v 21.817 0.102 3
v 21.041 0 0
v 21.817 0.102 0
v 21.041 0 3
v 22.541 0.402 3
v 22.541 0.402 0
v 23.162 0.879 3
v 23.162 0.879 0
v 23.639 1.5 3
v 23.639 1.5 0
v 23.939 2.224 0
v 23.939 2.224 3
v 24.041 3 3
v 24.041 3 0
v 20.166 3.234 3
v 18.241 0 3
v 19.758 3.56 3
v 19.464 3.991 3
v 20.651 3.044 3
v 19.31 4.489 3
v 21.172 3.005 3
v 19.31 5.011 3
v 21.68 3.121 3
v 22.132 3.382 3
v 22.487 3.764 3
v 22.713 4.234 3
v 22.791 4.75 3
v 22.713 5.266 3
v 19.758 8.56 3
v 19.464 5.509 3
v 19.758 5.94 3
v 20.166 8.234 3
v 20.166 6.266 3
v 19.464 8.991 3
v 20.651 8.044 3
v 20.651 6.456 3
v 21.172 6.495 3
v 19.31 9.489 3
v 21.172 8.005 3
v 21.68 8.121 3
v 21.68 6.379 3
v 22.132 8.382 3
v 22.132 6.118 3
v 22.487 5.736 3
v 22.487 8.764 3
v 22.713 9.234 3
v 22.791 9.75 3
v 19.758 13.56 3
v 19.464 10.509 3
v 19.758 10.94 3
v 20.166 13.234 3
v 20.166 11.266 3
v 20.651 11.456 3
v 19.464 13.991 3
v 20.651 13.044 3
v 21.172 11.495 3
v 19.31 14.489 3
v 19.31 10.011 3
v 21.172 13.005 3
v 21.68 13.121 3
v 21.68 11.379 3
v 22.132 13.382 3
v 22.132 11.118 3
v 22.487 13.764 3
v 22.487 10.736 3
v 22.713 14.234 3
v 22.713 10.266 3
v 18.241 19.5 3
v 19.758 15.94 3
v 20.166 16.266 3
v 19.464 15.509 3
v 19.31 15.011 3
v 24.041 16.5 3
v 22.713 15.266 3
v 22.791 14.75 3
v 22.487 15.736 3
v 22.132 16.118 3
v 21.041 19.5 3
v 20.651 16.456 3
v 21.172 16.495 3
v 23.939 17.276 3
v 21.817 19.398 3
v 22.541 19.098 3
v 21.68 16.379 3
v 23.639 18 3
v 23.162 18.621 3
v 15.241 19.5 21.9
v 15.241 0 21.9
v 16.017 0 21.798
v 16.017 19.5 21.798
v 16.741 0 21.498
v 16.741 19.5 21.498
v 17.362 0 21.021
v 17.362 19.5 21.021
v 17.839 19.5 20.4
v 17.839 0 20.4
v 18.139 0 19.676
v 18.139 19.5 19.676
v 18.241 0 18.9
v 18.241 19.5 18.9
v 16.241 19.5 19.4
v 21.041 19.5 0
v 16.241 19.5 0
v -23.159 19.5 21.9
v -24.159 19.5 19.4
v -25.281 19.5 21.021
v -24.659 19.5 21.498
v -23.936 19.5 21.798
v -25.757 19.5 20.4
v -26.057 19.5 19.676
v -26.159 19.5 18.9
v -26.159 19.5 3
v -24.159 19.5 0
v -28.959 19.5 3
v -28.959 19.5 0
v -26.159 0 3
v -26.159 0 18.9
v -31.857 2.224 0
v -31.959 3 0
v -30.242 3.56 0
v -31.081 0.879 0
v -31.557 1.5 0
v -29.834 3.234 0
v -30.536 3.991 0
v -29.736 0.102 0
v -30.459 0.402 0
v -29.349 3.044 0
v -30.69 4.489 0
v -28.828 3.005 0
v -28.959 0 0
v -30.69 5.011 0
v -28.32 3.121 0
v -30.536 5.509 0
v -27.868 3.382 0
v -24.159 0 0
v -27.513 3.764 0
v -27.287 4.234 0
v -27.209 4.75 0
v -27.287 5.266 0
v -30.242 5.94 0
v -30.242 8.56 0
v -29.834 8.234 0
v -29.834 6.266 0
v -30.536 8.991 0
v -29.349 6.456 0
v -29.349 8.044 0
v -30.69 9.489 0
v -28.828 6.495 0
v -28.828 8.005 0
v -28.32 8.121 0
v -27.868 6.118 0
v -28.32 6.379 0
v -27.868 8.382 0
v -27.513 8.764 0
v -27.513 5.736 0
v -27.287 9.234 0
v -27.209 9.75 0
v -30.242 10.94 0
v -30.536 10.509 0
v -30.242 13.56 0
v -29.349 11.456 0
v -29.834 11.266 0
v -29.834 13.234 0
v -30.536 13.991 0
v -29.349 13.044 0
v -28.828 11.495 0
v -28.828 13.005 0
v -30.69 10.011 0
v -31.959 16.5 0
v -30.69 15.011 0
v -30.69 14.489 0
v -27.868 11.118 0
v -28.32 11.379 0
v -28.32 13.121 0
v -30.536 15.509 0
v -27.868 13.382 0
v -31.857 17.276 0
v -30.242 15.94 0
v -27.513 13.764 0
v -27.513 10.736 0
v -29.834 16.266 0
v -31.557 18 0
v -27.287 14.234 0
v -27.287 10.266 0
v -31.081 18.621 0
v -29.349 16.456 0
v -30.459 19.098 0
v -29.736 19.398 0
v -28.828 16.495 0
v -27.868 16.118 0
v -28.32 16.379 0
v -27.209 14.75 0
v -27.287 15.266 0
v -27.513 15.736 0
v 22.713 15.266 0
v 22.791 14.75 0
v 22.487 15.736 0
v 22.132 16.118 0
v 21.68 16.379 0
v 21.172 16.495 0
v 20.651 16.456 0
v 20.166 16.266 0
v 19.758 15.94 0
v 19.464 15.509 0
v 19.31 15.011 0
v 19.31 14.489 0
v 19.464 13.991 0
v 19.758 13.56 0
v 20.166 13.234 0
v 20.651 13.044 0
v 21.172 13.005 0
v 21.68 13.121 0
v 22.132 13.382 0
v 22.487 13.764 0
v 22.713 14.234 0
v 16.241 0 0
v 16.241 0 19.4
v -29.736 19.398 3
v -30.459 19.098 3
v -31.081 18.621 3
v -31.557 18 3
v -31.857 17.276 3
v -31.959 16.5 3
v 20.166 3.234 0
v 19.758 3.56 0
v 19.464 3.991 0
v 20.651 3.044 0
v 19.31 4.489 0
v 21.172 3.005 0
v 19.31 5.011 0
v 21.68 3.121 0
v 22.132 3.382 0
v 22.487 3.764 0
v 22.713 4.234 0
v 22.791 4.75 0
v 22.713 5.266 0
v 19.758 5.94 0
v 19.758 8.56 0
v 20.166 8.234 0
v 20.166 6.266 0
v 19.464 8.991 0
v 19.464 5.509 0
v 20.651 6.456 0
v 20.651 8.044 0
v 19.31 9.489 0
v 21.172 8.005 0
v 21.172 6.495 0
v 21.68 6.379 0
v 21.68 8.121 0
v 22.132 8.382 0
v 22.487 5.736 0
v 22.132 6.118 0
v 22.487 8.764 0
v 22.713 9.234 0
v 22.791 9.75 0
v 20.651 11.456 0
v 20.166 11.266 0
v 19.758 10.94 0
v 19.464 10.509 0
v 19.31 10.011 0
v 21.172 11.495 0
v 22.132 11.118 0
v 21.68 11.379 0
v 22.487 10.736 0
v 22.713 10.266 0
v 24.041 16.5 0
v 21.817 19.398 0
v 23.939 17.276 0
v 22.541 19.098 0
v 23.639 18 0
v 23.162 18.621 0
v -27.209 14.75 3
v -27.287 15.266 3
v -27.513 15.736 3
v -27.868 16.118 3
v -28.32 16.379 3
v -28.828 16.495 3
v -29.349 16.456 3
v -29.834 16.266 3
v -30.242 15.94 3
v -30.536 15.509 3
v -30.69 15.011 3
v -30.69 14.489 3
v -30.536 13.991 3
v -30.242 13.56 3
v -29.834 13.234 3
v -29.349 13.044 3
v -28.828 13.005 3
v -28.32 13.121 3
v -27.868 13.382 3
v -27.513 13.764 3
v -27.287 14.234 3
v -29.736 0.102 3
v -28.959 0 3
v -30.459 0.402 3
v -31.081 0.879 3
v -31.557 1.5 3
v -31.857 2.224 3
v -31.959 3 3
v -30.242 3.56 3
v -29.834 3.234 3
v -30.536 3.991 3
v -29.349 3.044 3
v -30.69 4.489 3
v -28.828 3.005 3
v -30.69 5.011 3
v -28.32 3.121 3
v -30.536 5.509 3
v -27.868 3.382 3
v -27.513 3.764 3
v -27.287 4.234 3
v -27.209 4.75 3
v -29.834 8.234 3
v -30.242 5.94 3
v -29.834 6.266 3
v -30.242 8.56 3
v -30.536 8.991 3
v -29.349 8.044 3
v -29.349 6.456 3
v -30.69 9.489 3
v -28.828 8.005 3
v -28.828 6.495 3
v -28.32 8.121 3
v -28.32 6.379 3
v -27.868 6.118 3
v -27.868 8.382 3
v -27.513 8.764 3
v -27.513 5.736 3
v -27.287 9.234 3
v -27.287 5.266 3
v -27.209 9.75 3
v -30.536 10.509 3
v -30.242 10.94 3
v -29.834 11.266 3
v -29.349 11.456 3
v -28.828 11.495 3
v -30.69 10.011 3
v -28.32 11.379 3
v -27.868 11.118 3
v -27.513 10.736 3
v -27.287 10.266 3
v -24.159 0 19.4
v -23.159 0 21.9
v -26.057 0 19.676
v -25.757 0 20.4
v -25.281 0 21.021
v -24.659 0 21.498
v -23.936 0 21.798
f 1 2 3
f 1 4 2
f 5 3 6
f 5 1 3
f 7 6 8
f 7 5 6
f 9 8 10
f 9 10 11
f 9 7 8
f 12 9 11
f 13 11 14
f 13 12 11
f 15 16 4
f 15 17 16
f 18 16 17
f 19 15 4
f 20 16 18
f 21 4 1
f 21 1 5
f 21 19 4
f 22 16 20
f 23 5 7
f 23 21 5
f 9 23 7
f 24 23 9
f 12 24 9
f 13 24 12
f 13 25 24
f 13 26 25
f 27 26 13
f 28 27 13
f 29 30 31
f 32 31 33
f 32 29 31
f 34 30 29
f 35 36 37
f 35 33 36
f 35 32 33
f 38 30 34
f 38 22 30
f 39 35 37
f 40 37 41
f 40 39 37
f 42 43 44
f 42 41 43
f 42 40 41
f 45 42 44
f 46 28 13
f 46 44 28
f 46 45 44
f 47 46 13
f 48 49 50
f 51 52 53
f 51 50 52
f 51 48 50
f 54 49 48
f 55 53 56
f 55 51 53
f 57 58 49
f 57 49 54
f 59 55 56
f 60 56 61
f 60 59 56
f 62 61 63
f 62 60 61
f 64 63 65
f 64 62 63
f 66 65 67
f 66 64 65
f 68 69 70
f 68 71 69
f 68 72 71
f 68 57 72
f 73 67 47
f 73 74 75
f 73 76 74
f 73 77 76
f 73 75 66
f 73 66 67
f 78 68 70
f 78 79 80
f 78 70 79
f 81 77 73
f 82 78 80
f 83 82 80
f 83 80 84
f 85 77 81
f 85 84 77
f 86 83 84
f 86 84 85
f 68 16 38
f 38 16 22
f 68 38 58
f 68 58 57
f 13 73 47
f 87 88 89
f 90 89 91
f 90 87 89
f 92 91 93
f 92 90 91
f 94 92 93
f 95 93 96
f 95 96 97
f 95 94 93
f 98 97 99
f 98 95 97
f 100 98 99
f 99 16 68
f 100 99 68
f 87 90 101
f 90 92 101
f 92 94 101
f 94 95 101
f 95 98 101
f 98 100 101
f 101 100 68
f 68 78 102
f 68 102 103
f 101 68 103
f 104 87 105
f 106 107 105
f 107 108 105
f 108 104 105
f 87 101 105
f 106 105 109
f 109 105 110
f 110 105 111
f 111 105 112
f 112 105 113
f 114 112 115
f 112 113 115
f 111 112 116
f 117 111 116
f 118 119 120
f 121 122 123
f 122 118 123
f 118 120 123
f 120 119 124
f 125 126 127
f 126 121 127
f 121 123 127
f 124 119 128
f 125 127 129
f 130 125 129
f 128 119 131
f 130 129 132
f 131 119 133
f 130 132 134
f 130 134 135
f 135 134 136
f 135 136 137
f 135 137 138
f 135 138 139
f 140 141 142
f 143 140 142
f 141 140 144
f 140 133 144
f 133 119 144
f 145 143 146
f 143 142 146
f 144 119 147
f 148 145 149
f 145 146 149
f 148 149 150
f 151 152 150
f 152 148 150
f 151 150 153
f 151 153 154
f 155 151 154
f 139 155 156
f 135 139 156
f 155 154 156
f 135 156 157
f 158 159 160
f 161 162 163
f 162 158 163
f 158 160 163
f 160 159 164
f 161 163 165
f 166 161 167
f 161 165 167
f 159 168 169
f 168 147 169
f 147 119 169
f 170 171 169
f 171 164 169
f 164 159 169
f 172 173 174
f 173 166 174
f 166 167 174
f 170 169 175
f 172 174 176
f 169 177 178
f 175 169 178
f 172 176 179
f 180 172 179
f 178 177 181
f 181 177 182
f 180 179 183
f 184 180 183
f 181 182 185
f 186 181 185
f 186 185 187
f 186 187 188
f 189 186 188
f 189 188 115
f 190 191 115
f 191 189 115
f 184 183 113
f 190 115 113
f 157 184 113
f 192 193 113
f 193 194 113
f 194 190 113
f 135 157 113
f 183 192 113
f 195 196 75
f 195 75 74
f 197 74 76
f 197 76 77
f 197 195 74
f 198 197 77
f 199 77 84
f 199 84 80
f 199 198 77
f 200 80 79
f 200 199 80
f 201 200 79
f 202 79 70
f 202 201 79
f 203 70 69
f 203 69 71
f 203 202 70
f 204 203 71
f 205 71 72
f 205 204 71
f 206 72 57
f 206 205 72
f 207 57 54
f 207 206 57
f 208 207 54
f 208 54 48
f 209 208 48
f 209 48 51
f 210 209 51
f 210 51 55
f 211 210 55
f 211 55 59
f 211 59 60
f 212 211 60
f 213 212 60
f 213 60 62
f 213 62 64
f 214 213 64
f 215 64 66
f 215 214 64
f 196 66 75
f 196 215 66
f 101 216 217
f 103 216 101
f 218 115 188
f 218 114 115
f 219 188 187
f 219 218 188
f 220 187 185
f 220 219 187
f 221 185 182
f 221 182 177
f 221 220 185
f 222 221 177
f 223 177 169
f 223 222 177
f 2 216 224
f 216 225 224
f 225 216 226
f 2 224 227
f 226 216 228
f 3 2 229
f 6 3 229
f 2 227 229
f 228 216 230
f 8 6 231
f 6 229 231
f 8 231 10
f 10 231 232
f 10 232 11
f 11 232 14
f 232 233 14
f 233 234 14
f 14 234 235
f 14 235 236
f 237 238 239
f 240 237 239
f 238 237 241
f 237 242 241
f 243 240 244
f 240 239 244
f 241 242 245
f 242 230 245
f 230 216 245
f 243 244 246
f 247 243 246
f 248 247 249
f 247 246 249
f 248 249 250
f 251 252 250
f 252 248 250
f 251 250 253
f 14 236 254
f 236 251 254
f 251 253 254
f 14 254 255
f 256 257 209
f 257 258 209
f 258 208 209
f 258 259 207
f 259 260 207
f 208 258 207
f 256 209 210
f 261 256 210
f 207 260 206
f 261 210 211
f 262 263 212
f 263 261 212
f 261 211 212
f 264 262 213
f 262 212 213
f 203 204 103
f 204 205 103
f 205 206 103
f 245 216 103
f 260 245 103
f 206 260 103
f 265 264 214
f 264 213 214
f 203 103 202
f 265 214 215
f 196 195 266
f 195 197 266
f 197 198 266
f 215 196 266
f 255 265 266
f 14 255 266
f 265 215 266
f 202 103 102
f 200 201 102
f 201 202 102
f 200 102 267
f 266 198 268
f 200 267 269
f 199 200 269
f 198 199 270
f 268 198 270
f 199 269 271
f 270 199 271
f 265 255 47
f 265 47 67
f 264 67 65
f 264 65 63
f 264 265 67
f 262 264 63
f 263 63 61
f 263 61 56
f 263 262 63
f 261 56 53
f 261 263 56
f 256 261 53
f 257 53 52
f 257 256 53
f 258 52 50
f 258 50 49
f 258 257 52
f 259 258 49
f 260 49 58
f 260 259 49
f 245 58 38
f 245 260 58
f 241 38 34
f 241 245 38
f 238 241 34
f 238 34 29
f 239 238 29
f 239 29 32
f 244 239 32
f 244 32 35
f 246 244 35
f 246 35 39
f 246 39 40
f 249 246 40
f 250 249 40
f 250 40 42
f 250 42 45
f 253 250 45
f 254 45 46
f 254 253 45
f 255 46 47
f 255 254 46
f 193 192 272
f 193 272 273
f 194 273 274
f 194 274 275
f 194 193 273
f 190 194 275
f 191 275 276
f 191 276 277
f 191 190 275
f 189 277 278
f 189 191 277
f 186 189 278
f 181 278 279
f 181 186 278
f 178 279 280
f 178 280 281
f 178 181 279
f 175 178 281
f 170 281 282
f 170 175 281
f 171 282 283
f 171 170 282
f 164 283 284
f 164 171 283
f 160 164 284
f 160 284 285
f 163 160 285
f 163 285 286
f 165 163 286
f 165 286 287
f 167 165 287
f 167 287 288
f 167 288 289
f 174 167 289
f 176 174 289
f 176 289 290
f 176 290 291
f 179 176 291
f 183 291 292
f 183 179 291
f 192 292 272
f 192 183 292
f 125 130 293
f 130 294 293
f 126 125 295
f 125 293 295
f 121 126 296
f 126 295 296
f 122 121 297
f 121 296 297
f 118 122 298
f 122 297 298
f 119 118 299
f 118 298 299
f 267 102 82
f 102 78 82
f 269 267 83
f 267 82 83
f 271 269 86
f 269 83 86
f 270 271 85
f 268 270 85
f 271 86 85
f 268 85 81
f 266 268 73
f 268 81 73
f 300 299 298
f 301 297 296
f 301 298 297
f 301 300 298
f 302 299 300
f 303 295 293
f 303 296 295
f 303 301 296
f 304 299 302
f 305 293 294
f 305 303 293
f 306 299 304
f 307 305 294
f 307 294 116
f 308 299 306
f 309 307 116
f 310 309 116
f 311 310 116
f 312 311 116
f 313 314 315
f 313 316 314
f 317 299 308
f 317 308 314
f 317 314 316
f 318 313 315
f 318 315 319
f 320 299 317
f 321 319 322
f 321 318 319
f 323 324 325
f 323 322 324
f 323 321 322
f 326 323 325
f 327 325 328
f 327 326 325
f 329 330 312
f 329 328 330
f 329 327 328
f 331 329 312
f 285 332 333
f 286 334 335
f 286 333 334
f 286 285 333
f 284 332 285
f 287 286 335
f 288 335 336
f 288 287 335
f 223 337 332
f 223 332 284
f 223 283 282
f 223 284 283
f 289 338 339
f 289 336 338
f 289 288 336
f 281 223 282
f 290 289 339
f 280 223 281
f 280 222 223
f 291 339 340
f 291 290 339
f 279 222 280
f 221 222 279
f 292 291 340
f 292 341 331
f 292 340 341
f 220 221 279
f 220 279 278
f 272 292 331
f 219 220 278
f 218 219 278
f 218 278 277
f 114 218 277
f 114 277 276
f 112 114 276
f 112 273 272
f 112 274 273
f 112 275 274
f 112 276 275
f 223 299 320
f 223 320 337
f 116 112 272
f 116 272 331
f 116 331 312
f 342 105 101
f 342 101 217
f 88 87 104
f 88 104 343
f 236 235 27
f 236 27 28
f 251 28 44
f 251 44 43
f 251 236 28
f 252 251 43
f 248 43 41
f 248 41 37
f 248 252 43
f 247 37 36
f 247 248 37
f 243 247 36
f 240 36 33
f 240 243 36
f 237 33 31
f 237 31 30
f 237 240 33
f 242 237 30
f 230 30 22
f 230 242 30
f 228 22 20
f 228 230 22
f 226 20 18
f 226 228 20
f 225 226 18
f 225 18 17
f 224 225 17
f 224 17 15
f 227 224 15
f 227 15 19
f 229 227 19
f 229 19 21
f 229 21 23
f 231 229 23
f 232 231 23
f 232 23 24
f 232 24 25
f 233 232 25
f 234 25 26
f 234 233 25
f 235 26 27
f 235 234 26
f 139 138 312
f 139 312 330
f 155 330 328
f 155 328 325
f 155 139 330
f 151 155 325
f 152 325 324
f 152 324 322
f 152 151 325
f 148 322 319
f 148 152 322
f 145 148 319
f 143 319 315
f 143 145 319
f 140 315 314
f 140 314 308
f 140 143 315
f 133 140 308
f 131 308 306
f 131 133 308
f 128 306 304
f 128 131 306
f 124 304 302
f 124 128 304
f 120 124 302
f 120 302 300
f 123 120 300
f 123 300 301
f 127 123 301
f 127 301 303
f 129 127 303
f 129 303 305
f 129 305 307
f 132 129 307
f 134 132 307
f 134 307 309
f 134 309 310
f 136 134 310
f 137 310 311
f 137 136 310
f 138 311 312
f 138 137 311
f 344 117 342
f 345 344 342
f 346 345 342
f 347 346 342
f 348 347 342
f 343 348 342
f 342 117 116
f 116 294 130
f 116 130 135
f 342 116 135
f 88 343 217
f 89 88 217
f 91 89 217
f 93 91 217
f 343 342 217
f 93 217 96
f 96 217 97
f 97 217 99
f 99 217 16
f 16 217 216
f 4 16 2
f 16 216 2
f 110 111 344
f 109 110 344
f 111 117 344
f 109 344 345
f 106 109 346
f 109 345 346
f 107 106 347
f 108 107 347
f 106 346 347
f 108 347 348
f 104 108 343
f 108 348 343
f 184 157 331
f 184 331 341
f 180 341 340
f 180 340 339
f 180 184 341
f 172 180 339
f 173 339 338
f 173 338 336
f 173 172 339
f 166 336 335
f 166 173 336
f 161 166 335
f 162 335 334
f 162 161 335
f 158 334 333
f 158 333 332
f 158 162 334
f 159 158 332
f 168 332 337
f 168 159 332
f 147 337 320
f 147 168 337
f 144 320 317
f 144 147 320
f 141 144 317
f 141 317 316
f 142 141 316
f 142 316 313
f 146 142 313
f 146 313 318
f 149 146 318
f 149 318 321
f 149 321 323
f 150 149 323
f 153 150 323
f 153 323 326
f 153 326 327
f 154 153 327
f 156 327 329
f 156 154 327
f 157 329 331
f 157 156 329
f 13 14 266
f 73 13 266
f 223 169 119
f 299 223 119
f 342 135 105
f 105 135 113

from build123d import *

# Parameters (mm, degrees)
F0_W     = 2
F0_H     = 19.5
F1_DEPTH = 21.9
F2_W     = 19.5
F2_H     = 2.5
F3_DEPTH = 40.4
F0_R     = 1.75
F4_DEPTH = 3
F5_R     = 3


with BuildPart() as f1:
    # F0 (on Top) → F1 (new body)
    with BuildSketch(Plane.XY):
        Polygon((-24.159199, 0), (-24.159199, 19.5), (-26.159199, 19.5), (-26.159199, 9.75), (-26.159199, 0), align=None)
        with Locations((17.240801, 9.75)):
            Rectangle(F0_W, F0_H)
    extrude(amount=F1_DEPTH)

    # F2 (on face) → F3 (join, through all)
    with BuildSketch(Plane(origin=(16.240801, 0, 0), x_dir=(0, -1, 0), z_dir=(-1, 0, 0))):
        with Locations((-9.75, 20.65)):
            Rectangle(F2_W, F2_H)
    extrude(amount=F3_DEPTH)

    # F0 (on Top) → F4 (join)
    with BuildSketch(Plane.XY):
        Polygon((-26.159199, 9.75), (-26.159199, 19.5), (-28.959199, 19.5), (-31.959199, 19.5), (-31.959199, 0), (-28.959199, 0), (-26.159199, 0), align=None)
        with Locations((-28.959199, 4.75)):
            Circle(F0_R, mode=Mode.SUBTRACT)
        with Locations((-28.959199, 9.75)):
            Circle(F0_R, mode=Mode.SUBTRACT)
        with Locations((-28.959199, 14.75)):
            Circle(F0_R, mode=Mode.SUBTRACT)
        Polygon((21.040801, 19.5), (18.240801, 19.5), (18.240801, 0), (21.040801, 0), (24.040801, 0), (24.040801, 19.5), align=None)
        with Locations((21.040801, 4.75)):
            Circle(F0_R, mode=Mode.SUBTRACT)
        with Locations((21.040801, 9.75)):
            Circle(F0_R, mode=Mode.SUBTRACT)
        with Locations((21.040801, 14.75)):
            Circle(F0_R, mode=Mode.SUBTRACT)
    extrude(amount=F4_DEPTH)

    # F5
    f5_edges = [f1.edges().sort_by_distance(p)[0] for p in [
        (18.240801, 9.75, 21.9),
        (-26.159199, 9.75, 21.9),
        (24.040801, 0, 1.5),
        (24.040801, 19.5, 1.5),
        (-31.959199, 19.5, 1.5),
        (-31.959199, 0, 1.5),
    ]]
    fillet(f5_edges, radius=F5_R)


solid = f1.part
